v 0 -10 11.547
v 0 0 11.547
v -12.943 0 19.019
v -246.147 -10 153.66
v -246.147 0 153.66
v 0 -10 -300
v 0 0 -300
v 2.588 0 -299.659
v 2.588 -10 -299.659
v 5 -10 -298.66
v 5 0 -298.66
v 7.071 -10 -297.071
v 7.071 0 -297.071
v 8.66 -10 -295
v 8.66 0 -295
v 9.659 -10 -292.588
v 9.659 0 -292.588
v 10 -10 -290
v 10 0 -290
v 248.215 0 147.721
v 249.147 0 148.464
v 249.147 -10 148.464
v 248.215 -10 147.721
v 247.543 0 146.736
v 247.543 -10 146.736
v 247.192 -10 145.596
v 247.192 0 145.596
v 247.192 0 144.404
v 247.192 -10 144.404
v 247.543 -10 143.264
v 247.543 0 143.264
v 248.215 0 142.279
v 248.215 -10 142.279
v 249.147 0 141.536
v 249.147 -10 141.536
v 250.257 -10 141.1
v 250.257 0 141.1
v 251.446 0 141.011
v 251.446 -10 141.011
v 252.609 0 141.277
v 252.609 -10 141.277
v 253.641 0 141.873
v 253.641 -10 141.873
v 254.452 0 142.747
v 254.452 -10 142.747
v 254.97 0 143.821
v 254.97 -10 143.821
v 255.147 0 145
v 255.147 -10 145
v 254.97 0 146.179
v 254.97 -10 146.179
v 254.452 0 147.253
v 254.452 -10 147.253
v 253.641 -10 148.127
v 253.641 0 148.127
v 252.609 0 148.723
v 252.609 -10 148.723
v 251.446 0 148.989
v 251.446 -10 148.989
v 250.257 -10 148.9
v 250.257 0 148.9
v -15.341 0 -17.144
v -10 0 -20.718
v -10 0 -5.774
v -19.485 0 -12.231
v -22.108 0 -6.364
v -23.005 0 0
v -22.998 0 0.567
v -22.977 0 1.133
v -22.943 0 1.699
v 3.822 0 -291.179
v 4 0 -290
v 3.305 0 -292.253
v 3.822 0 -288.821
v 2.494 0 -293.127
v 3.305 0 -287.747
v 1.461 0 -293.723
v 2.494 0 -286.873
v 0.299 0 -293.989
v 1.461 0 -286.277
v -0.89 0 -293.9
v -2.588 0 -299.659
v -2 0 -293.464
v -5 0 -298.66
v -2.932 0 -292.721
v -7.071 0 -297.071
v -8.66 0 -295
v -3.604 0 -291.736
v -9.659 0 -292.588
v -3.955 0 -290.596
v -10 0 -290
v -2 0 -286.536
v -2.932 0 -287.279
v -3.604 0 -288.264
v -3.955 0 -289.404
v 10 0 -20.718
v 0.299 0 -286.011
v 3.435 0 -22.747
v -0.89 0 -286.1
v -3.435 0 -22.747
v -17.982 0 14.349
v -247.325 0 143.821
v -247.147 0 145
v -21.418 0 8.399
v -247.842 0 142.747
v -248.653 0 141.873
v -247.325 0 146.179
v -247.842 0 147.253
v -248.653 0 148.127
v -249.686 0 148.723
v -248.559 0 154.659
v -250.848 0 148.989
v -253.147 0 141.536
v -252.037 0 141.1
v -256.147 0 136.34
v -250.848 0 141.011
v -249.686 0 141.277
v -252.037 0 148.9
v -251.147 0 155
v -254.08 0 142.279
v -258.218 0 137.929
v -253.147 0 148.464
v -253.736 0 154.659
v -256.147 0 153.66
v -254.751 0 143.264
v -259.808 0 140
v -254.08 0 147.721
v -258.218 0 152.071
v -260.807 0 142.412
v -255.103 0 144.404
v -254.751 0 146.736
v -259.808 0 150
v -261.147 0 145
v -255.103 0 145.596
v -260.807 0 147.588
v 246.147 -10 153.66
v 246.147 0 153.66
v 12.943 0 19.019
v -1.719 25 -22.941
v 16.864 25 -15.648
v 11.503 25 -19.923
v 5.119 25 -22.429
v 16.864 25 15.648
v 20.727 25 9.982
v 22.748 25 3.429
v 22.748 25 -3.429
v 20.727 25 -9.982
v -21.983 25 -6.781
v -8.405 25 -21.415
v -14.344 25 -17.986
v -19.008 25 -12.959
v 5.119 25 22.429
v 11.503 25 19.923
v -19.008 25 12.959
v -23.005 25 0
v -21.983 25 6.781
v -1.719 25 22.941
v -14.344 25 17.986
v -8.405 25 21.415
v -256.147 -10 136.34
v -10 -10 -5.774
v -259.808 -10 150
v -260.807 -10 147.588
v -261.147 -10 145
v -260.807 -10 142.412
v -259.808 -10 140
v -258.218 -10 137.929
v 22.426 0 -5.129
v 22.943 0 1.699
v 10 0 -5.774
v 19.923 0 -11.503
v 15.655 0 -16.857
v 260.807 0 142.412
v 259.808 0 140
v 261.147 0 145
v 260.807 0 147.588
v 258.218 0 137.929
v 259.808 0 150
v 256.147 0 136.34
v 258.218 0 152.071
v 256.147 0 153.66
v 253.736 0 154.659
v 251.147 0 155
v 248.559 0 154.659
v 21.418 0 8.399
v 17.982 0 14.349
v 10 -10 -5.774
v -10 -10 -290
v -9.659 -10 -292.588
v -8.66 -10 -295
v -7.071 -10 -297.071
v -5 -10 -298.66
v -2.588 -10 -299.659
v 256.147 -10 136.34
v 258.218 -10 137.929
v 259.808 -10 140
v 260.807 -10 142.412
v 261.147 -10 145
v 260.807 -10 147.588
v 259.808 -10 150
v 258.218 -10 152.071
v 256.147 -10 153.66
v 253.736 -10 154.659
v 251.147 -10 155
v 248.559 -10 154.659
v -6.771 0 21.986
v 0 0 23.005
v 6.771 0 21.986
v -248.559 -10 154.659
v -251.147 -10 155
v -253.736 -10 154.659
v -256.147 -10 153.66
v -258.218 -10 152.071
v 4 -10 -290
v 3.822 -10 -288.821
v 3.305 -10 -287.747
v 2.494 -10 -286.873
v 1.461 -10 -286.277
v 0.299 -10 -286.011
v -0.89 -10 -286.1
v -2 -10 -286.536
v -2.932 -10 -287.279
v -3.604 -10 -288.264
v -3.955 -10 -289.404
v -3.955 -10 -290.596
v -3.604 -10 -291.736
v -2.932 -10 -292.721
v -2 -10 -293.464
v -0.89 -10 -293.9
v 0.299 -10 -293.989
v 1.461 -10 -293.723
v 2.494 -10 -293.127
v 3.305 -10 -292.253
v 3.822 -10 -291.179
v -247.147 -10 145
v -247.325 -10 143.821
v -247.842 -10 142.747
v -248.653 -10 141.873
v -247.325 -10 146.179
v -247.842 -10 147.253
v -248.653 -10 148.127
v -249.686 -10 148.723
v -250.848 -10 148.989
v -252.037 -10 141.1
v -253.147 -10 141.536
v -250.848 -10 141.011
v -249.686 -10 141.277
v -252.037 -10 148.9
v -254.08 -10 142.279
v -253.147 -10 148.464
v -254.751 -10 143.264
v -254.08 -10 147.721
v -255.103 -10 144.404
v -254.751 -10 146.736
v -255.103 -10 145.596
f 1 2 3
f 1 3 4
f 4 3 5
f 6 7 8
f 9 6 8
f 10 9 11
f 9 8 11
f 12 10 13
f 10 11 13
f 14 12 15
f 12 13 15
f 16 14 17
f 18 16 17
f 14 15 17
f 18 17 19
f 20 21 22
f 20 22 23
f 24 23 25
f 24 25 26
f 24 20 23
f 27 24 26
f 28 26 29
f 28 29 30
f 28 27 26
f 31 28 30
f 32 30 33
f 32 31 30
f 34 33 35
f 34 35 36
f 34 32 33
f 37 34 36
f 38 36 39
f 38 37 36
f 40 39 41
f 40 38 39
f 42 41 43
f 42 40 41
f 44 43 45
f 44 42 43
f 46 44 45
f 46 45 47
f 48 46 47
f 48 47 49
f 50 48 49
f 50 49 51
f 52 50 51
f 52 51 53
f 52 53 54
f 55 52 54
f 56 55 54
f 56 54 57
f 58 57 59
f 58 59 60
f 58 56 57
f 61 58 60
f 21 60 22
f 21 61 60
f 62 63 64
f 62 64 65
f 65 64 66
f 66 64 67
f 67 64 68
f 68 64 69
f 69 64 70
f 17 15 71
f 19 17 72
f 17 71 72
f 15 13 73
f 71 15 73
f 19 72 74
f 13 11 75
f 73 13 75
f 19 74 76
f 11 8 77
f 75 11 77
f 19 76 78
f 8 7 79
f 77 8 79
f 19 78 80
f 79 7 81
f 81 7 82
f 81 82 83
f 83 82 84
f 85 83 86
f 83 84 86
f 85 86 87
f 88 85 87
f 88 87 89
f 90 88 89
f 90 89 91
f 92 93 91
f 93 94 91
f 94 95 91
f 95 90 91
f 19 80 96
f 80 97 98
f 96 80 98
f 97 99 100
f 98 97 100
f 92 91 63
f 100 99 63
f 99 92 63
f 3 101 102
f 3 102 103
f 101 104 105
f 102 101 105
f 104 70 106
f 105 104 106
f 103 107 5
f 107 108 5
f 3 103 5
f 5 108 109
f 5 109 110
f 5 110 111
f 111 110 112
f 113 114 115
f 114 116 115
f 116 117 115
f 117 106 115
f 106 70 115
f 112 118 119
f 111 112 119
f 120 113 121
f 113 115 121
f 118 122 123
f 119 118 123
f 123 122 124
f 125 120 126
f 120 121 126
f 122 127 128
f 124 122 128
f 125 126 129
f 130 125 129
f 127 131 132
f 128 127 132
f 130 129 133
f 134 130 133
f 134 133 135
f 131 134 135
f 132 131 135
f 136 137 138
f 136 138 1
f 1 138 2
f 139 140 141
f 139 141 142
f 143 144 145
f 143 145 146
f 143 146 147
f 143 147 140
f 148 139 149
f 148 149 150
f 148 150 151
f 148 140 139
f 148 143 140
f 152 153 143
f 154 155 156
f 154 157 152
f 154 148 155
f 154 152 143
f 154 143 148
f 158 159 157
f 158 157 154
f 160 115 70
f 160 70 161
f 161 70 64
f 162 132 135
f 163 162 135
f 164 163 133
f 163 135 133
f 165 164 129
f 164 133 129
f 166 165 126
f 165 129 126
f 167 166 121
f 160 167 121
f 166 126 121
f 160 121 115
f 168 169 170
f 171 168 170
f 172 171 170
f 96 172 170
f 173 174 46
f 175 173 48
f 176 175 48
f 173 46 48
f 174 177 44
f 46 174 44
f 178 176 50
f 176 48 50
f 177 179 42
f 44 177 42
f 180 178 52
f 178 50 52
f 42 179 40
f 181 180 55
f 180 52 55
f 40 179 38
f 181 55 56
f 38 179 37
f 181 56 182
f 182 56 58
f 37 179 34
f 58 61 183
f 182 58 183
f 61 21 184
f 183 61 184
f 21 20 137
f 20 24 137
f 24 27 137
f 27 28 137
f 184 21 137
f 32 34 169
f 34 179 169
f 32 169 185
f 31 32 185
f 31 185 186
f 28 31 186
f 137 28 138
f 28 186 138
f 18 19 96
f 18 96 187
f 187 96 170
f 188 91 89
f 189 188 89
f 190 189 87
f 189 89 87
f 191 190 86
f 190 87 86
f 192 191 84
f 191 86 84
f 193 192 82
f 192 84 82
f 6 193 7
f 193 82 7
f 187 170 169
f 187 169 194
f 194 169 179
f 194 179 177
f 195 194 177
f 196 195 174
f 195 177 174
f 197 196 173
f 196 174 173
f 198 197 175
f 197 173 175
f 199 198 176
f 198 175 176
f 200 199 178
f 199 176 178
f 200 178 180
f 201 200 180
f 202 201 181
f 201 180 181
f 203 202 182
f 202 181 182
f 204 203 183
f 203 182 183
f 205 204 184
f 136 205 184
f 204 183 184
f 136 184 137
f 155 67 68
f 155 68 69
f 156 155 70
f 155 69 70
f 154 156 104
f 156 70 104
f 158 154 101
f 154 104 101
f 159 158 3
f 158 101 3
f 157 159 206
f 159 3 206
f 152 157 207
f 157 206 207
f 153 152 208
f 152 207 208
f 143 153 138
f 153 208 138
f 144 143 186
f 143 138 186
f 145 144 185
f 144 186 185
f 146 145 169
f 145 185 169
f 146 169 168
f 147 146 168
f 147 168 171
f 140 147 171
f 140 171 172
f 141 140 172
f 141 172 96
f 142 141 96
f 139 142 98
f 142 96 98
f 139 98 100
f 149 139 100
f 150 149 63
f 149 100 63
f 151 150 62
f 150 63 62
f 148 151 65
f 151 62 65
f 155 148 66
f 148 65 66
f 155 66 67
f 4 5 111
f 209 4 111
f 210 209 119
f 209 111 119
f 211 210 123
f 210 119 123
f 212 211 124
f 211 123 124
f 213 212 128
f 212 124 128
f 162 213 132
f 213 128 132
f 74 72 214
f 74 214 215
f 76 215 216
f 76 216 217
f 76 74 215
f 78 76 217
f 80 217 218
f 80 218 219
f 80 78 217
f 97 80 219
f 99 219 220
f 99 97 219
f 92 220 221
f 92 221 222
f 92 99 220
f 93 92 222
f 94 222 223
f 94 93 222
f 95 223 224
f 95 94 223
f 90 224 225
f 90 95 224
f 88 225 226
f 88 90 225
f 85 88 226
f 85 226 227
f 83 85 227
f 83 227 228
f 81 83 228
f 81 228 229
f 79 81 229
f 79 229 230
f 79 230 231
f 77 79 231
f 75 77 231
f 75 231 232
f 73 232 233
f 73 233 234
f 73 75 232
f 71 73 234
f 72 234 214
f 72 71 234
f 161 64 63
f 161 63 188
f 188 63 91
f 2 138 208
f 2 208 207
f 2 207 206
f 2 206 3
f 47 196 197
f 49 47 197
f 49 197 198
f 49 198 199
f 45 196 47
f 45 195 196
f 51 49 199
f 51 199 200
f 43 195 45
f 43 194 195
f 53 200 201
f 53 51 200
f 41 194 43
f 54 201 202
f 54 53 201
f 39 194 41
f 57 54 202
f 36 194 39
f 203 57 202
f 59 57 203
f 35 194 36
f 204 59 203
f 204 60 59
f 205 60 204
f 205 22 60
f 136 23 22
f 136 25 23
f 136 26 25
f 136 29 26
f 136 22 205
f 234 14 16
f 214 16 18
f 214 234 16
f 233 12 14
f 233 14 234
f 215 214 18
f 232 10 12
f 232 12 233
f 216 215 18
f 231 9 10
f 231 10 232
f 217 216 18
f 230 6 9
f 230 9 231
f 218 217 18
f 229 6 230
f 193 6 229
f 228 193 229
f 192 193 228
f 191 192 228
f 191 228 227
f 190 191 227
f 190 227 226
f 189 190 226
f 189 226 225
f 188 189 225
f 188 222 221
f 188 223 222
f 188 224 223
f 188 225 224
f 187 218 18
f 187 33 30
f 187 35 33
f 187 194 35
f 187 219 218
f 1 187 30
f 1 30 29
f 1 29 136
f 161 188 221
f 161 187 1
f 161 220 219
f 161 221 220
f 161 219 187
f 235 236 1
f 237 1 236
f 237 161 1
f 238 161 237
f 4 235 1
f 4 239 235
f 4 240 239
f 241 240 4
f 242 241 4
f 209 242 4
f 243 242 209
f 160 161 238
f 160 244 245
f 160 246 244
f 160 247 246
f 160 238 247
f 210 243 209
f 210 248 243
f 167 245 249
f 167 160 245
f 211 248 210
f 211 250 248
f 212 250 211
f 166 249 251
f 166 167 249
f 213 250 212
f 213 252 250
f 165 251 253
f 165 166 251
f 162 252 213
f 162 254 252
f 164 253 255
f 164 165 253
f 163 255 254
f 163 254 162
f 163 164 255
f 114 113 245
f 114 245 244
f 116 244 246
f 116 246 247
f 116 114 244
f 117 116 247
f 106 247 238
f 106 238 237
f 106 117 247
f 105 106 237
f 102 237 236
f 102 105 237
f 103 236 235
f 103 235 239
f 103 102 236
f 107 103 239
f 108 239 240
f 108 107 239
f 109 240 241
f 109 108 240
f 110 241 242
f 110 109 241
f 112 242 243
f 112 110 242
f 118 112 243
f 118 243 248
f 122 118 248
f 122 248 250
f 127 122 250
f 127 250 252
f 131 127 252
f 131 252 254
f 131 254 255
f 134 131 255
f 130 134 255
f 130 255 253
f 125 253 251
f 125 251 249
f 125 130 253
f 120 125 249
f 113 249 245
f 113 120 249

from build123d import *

# Parameters (mm, degrees)
F0_R     = 4
F1_DEPTH = 10
F3_COUNT = 3
F3_ANGLE = 240
F4_R     = 23.0054
F5_DEPTH = 25


with BuildPart() as f1:
    # F0 (on Front) → F1 (new body)
    with BuildSketch(Plane.XZ):
        with BuildLine():
            Line((10, 0), (-10, 0))
            Line((-10, 0), (-10, -290))
            ThreePointArc((-10, -290), (-7.071068, -297.071068), (0, -300))
            ThreePointArc((0, -300), (7.071068, -297.071068), (10, -290))
            Line((10, -290), (10, 0))
        make_face()
        with Locations((0, -290)):
            Circle(F0_R, mode=Mode.SUBTRACT)
    extrude(amount=F1_DEPTH)



with BuildPart() as f3_1:
    # F3: instance of F1
    add(f1.part.rotate(Axis((0, -33.912361, 0), (0, -1, 0)), 1 * F3_ANGLE / (F3_COUNT - 1)))


with BuildPart() as f3_2:
    # F3: instance of F1
    add(f1.part.rotate(Axis((0, -33.912361, 0), (0, -1, 0)), 2 * F3_ANGLE / (F3_COUNT - 1)))


with BuildPart() as f1_1:
    add(f1.part)

    add(f3_1.part)  # F5 merges F3_1

    add(f3_2.part)  # F5 merges F3_2
    # F4 (on face) → F5 (join)
    with BuildSketch(Plane(origin=(0, 0, 0), x_dir=(-1, 0, 0), z_dir=(0, 1, 0))):
        Circle(F4_R)
    extrude(amount=F5_DEPTH)


solid = f1_1.part
